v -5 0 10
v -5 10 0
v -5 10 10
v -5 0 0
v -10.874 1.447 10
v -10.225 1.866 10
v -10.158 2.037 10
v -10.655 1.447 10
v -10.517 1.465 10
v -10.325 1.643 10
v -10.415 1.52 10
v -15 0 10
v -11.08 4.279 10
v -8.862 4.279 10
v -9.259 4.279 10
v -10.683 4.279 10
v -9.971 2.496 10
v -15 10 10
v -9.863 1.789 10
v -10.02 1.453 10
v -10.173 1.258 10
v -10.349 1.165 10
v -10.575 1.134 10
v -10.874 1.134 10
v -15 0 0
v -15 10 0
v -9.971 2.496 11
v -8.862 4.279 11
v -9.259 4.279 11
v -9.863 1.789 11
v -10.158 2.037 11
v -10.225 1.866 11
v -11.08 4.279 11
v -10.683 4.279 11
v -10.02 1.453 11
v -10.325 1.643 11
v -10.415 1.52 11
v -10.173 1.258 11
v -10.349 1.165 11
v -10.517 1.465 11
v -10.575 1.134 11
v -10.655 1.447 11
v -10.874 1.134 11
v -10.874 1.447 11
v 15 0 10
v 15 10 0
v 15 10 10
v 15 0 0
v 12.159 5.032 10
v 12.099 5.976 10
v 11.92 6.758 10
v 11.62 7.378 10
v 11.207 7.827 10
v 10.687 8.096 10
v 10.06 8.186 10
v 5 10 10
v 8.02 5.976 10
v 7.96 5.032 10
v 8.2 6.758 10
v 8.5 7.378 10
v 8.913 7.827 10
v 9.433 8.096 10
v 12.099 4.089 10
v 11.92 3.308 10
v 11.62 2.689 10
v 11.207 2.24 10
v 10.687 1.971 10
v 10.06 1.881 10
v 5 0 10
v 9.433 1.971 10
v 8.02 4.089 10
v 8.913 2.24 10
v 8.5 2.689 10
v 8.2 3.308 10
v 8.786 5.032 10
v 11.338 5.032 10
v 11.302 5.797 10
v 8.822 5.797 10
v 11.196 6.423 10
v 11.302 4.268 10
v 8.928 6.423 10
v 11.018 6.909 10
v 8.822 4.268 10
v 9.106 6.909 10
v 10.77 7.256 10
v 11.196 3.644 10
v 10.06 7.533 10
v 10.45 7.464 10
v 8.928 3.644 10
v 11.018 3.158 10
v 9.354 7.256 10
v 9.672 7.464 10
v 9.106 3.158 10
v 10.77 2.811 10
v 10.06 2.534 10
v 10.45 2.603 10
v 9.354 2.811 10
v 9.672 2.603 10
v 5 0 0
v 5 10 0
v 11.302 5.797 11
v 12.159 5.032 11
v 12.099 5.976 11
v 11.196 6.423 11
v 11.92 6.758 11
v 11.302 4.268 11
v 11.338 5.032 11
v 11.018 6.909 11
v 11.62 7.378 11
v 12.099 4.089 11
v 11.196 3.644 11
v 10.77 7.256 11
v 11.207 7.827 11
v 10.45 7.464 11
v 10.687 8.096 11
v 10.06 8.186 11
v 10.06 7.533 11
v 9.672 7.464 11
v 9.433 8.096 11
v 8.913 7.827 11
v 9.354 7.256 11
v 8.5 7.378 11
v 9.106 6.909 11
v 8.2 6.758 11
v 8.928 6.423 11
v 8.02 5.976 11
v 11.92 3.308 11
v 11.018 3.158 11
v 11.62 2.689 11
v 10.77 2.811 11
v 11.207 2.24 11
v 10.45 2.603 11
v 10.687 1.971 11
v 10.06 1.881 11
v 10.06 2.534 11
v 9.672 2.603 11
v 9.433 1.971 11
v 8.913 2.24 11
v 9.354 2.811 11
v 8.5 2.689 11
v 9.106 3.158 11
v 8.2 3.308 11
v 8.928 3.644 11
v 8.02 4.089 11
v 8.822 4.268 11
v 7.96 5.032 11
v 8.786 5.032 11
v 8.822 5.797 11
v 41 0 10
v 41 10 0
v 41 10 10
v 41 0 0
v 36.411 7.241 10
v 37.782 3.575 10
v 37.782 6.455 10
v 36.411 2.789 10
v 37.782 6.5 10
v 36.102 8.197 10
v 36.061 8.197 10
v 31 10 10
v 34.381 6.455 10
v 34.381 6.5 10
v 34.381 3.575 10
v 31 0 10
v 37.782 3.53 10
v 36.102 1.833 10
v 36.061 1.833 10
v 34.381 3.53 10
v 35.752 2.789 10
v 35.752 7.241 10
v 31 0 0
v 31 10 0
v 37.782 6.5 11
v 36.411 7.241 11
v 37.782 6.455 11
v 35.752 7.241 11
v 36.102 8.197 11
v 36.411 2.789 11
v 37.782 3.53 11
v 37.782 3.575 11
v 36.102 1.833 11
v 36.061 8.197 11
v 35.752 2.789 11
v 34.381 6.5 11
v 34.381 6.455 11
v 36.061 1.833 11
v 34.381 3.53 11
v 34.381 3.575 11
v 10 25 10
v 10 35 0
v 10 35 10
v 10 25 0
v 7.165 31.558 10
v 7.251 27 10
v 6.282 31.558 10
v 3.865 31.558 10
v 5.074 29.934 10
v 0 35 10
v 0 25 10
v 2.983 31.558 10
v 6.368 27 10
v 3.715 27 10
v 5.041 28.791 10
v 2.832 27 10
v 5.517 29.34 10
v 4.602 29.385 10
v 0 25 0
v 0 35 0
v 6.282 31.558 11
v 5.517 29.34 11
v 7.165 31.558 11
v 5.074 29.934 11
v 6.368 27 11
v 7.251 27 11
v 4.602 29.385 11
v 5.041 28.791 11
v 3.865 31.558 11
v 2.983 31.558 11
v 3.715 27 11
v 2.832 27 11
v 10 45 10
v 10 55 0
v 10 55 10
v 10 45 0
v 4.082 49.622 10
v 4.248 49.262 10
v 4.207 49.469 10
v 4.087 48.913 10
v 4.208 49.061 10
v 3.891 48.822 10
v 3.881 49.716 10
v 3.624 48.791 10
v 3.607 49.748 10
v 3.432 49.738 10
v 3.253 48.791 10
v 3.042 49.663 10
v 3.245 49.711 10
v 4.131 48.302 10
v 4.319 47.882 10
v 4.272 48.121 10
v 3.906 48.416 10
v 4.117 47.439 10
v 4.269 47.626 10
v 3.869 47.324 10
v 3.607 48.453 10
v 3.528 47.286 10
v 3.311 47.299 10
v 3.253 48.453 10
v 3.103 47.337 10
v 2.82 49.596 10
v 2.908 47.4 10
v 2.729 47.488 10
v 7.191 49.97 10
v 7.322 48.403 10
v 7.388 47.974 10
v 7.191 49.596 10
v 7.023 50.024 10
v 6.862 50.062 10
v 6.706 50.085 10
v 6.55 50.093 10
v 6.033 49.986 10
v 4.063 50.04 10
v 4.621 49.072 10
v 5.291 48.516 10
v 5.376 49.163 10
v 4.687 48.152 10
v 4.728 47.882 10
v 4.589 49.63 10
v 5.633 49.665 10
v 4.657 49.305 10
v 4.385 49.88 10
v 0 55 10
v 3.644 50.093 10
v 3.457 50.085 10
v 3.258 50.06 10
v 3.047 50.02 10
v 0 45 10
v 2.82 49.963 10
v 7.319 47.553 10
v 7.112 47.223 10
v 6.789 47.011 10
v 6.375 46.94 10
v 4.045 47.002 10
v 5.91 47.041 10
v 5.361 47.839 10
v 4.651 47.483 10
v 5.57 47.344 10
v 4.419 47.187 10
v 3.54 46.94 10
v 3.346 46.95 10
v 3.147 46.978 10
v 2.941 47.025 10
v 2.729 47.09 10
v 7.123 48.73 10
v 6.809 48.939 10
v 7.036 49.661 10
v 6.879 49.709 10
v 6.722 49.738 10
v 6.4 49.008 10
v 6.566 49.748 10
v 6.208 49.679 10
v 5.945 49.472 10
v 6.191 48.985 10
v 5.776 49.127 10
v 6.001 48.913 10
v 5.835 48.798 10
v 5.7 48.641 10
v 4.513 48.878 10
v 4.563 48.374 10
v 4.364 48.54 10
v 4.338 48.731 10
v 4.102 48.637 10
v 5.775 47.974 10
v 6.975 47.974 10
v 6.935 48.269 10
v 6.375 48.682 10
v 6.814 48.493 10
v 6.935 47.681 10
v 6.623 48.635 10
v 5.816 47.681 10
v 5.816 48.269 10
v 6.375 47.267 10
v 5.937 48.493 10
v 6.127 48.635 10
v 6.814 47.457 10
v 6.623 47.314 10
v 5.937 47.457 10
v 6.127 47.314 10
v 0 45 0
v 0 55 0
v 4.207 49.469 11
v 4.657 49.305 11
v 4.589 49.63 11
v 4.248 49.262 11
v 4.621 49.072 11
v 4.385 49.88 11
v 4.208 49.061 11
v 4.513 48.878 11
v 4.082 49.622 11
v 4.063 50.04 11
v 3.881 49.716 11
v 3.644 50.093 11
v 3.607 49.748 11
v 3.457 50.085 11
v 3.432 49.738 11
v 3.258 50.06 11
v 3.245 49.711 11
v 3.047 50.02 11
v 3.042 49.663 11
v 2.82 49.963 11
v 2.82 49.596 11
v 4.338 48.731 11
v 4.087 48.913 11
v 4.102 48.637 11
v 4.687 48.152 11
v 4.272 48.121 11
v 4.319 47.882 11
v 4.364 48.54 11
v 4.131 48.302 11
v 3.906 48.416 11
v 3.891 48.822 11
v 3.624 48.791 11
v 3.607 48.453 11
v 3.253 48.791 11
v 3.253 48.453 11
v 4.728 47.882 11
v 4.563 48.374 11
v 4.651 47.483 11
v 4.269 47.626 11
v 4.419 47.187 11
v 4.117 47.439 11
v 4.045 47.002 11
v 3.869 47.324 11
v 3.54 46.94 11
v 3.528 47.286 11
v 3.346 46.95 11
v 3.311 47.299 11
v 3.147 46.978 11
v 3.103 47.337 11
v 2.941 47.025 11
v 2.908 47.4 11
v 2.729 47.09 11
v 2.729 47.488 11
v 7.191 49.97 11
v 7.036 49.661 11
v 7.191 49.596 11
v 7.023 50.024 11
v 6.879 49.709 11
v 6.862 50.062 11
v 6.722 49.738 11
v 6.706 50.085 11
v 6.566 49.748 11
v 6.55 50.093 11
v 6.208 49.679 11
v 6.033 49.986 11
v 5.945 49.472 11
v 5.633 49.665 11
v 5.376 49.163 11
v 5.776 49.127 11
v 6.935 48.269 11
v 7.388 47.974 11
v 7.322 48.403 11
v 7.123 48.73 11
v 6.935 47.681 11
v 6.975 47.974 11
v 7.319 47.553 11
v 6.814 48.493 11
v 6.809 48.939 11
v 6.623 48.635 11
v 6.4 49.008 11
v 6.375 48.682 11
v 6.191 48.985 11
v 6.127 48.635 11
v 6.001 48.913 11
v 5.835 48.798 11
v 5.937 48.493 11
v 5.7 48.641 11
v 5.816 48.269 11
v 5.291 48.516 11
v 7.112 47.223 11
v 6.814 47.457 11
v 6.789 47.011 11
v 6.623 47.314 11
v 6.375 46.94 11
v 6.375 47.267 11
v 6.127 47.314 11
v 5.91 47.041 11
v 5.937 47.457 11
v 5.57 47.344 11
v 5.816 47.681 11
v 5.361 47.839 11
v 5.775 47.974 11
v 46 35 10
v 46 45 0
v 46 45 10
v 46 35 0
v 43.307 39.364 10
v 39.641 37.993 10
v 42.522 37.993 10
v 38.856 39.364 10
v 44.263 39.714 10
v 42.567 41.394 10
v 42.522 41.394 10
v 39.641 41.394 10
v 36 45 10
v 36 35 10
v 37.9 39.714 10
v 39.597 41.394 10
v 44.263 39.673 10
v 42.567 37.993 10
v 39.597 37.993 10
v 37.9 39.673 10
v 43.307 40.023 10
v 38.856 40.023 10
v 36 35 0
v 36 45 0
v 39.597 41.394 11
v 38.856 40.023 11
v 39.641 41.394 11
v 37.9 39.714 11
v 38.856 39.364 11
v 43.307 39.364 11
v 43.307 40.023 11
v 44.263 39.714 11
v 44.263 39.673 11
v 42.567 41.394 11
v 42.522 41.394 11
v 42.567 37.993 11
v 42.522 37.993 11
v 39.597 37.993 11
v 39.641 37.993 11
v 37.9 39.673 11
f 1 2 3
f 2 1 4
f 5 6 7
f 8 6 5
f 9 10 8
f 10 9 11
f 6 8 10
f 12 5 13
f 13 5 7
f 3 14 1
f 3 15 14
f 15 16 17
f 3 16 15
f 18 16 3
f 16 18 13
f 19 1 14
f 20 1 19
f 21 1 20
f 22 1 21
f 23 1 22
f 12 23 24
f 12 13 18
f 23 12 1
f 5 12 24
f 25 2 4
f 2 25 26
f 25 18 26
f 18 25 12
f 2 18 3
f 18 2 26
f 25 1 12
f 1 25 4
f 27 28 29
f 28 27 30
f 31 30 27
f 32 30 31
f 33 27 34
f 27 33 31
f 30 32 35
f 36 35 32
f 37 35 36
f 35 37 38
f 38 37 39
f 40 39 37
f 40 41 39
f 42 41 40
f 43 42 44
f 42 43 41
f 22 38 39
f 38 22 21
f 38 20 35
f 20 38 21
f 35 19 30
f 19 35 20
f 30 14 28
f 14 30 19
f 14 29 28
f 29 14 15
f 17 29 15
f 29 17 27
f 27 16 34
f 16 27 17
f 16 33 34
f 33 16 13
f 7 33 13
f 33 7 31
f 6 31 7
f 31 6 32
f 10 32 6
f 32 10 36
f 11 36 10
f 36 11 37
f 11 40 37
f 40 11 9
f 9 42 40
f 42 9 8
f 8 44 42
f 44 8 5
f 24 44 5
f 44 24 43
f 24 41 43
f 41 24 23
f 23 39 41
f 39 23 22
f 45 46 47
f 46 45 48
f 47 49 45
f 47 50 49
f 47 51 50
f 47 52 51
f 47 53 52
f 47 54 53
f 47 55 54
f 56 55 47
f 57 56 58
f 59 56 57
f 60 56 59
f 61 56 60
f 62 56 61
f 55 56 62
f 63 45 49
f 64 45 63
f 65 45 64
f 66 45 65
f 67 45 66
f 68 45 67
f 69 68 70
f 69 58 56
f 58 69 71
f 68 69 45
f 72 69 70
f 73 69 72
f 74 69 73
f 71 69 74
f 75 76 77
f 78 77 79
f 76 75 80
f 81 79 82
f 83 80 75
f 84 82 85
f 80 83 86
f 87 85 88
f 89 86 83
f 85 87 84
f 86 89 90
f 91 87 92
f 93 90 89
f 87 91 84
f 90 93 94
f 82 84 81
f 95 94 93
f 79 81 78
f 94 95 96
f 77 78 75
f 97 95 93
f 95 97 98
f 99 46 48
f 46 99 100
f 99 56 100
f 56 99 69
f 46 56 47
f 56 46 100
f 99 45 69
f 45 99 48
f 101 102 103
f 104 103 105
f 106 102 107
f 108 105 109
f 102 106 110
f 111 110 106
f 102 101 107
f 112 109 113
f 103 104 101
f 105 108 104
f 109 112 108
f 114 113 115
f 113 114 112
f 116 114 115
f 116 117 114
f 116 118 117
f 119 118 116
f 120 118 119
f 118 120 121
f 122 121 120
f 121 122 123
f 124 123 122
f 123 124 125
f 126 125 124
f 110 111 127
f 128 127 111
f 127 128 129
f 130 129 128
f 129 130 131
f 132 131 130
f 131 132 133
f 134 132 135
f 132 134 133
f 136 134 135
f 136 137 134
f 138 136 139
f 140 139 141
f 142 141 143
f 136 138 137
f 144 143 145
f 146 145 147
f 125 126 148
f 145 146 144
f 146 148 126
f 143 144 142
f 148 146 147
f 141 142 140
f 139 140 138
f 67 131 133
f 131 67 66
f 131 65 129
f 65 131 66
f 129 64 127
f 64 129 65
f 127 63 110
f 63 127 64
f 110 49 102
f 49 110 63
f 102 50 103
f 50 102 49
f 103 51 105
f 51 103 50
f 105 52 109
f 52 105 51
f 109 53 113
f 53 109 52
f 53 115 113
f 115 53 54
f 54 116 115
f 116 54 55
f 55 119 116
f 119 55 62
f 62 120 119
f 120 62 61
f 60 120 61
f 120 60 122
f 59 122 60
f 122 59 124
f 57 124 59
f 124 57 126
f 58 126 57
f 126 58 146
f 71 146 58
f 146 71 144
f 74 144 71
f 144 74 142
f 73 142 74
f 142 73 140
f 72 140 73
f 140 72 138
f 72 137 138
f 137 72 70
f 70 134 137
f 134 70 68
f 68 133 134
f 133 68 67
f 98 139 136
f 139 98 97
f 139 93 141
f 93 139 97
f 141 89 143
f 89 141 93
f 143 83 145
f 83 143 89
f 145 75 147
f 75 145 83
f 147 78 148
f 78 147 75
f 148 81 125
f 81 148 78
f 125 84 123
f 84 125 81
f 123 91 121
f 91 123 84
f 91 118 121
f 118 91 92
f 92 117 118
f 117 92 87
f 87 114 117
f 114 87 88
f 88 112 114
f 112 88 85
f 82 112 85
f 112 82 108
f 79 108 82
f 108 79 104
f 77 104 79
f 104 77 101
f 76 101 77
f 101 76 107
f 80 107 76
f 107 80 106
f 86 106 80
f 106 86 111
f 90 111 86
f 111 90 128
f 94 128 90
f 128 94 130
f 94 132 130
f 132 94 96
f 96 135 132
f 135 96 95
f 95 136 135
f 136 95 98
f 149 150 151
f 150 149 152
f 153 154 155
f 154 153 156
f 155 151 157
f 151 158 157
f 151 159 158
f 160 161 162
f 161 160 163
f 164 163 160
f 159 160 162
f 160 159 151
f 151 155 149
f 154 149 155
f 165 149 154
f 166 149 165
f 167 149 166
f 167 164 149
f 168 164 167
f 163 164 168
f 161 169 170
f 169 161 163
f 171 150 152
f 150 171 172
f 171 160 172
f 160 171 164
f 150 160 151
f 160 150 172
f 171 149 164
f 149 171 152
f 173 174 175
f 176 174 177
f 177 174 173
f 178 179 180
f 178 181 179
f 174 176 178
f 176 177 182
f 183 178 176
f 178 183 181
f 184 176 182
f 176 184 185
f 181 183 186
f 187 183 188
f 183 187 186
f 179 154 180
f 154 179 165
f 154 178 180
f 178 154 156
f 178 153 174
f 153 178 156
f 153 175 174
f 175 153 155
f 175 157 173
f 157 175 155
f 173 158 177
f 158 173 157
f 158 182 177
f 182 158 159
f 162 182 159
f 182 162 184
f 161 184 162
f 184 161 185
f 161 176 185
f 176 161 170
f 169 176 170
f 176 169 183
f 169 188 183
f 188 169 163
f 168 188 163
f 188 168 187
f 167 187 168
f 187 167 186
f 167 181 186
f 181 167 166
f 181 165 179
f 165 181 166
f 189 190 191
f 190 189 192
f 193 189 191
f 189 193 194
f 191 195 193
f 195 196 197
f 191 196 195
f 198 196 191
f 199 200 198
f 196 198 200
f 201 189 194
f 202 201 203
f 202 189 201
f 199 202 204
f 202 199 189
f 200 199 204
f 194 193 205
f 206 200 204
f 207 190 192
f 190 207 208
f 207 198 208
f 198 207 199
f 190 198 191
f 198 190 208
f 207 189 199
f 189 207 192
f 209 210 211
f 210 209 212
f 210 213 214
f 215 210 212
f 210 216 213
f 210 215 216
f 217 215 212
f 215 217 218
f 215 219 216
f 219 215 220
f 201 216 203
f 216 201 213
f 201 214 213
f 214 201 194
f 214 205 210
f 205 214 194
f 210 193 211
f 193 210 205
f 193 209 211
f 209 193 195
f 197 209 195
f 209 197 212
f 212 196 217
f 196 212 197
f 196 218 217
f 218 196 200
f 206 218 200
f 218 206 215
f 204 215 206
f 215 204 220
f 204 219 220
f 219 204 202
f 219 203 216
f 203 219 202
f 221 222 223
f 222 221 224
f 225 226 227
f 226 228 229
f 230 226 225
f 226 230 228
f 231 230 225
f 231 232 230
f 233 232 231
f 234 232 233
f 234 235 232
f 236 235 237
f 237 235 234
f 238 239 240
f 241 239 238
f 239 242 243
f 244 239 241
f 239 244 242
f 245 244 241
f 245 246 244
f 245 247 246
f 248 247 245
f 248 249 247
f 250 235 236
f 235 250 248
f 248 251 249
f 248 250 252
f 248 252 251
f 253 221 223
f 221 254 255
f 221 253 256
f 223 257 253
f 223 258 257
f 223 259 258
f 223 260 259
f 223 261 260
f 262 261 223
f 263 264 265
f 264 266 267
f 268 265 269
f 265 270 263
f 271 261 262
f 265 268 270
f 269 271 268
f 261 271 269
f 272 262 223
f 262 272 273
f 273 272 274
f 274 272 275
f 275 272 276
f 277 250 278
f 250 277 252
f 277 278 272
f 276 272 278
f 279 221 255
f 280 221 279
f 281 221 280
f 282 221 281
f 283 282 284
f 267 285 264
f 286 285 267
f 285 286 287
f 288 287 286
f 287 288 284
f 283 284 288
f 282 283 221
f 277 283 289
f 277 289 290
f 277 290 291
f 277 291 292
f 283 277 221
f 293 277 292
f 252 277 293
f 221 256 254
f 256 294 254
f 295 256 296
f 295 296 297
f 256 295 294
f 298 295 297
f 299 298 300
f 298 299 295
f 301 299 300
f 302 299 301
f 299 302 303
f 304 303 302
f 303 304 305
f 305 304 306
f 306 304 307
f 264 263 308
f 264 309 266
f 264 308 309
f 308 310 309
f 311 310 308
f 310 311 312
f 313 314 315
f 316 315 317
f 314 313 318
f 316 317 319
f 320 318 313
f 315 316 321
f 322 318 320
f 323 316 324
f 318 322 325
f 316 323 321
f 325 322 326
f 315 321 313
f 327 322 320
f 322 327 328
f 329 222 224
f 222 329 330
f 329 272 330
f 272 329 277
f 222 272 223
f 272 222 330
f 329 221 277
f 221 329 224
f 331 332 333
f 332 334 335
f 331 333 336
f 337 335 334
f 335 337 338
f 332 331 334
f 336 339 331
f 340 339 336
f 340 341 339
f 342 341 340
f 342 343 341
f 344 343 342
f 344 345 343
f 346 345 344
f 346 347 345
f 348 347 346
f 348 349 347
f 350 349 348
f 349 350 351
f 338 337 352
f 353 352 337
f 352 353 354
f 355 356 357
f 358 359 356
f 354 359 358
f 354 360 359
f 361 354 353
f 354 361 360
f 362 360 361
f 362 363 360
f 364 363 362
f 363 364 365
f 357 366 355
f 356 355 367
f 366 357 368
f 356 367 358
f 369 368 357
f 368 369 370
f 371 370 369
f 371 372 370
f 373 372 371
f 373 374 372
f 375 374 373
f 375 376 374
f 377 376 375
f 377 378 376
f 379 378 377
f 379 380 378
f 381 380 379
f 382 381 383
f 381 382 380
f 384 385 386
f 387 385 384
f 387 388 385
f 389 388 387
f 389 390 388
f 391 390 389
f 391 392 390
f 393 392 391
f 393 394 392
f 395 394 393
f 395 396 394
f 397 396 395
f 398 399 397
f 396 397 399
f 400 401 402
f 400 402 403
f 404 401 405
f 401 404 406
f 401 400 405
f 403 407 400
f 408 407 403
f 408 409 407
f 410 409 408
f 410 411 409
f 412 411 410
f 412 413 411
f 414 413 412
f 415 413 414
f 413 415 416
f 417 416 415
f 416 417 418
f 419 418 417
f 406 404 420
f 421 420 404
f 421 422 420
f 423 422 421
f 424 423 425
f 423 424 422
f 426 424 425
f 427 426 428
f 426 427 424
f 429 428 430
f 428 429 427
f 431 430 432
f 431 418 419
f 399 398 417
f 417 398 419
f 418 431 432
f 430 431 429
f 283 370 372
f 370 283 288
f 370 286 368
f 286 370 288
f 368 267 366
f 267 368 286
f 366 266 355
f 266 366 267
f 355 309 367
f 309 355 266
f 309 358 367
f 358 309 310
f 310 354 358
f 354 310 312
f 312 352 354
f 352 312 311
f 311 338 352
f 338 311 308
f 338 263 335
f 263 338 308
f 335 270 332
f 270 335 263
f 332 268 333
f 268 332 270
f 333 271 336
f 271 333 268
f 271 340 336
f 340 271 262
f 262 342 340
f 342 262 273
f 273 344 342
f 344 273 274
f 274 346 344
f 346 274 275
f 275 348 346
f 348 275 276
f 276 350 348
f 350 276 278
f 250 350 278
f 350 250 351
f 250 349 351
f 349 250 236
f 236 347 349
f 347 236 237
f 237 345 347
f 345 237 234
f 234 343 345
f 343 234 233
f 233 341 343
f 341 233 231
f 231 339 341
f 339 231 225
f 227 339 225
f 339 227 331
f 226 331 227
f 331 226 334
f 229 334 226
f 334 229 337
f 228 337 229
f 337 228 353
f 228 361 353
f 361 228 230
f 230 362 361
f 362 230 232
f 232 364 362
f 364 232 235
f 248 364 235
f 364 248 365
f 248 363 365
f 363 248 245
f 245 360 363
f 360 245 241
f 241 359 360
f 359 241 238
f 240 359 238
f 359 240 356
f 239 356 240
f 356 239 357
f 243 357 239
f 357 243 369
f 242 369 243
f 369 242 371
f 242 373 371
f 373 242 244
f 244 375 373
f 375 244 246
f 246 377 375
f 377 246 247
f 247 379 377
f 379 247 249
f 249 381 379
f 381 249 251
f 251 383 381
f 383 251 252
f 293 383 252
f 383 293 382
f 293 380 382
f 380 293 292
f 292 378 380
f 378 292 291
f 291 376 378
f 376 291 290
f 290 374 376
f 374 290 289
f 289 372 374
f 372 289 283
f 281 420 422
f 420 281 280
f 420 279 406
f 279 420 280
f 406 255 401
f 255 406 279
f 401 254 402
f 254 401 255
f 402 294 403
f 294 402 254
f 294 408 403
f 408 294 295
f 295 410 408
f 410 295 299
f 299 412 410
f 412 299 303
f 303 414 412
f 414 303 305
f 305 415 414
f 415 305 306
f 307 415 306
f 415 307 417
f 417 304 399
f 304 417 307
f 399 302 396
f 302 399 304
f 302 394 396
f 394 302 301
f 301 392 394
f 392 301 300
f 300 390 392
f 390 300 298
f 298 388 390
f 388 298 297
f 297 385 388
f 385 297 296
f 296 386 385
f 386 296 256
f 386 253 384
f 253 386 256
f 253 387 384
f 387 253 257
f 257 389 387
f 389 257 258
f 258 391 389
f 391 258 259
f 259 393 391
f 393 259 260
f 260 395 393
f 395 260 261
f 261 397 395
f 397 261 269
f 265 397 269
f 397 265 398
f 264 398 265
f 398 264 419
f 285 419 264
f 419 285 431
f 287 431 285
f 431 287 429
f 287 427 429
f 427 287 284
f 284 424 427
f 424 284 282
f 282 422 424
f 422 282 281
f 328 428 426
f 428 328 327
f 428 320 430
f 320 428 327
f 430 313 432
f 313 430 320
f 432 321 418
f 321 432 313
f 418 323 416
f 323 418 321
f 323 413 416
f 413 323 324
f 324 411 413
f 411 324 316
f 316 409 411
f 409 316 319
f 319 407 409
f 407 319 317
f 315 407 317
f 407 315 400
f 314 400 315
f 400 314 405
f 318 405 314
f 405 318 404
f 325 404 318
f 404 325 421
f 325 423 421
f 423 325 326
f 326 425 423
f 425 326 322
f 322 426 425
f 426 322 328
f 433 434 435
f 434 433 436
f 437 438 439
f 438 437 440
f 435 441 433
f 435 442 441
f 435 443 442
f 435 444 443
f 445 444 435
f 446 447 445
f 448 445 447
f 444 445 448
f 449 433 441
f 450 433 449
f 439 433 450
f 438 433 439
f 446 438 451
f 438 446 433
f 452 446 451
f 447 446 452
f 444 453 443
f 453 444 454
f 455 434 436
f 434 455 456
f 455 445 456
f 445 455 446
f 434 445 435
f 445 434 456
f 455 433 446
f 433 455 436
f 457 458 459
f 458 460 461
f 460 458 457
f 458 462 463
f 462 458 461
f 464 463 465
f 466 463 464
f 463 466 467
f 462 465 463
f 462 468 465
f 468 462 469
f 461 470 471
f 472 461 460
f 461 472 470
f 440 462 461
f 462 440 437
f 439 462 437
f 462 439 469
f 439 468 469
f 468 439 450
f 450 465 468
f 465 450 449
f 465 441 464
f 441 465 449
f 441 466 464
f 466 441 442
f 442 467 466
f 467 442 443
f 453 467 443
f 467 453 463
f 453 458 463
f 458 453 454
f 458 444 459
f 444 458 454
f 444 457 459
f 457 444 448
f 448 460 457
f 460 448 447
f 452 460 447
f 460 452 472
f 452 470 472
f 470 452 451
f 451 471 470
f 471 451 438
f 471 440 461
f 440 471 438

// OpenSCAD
// -*- mode: SCAD ; c-file-style: "ellemtel" ; coding: utf-8 -*-
//
// Rough extruder offest calibration
// Extruder one part
// Just a few simple blocks
//
// (c) 2017 Roland Sieker <ospalh@gmail.com>
// Licence: CC-BY-SA 4.0



// Change this to fit your actual printer, as well as you know
nozzle_offset_x = 36;
nozzle_offset_y = 0.0;



font_name = "Demos LT";
// font_name = "Palatino";
// font_name = "serif";
// font_name = "bugger, haven't got this one";
font_name_2 = "Demos X";
font_name_3 = "serif";
some_distance = 40;



// Y
translate([-15, 0, 0])
{
   cube([10,10,10]);
   translate([5, 2, 10])
   {
      linear_extrude(1)
      {
         text(text="y", size=3, font=font_name, halign="center",
              valgin="center");
      }
   }
}
translate([5, 0, 0])
{
   cube([10,10,10]);
   translate([5, 2, 10])
   {
      linear_extrude(1)
      {
         text(text=str(nozzle_offset_y), size=6, font=font_name_2,
              halign="center", valgin="center");
      }
   }
}


translate([nozzle_offset_x, nozzle_offset_y, 0])
{
   translate([-5, 0, 0])
   {
      cube([10,10,10]);
      translate([5, 2, 10])
      {
         linear_extrude(1)
         {
            text("↕", 6, font=font_name_3, halign="center", valgin="center");
         }
      }
   }
}


// X


translate([0, some_distance,0])
{
   translate([0, -15, 0])
   {
      cube([10,10,10]);
      translate([5, 2, 10])
      {
         linear_extrude(1)
         {
            text("x", 6, font=font_name, halign="center", valgin="center");
         }
      }
   }
   translate([0, 5, 0])
   {
      cube([10,10,10]);
      translate([5, 2, 10])
      {
         linear_extrude(1)
         {
            text(text=str(nozzle_offset_x), size=3, font=font_name_2,
                 halign="center", valgin="center");
         }
      }
   }

   translate([nozzle_offset_x, nozzle_offset_y, 0])
   {
      translate([0, -5, 0])
      {
         cube([10,10,10]);
         translate([5, 2, 10])
         {
            linear_extrude(1)
            {
               text("↔", 6, font=font_name_3, halign="center", valgin="center");
            }
         }
      }
   }
}
